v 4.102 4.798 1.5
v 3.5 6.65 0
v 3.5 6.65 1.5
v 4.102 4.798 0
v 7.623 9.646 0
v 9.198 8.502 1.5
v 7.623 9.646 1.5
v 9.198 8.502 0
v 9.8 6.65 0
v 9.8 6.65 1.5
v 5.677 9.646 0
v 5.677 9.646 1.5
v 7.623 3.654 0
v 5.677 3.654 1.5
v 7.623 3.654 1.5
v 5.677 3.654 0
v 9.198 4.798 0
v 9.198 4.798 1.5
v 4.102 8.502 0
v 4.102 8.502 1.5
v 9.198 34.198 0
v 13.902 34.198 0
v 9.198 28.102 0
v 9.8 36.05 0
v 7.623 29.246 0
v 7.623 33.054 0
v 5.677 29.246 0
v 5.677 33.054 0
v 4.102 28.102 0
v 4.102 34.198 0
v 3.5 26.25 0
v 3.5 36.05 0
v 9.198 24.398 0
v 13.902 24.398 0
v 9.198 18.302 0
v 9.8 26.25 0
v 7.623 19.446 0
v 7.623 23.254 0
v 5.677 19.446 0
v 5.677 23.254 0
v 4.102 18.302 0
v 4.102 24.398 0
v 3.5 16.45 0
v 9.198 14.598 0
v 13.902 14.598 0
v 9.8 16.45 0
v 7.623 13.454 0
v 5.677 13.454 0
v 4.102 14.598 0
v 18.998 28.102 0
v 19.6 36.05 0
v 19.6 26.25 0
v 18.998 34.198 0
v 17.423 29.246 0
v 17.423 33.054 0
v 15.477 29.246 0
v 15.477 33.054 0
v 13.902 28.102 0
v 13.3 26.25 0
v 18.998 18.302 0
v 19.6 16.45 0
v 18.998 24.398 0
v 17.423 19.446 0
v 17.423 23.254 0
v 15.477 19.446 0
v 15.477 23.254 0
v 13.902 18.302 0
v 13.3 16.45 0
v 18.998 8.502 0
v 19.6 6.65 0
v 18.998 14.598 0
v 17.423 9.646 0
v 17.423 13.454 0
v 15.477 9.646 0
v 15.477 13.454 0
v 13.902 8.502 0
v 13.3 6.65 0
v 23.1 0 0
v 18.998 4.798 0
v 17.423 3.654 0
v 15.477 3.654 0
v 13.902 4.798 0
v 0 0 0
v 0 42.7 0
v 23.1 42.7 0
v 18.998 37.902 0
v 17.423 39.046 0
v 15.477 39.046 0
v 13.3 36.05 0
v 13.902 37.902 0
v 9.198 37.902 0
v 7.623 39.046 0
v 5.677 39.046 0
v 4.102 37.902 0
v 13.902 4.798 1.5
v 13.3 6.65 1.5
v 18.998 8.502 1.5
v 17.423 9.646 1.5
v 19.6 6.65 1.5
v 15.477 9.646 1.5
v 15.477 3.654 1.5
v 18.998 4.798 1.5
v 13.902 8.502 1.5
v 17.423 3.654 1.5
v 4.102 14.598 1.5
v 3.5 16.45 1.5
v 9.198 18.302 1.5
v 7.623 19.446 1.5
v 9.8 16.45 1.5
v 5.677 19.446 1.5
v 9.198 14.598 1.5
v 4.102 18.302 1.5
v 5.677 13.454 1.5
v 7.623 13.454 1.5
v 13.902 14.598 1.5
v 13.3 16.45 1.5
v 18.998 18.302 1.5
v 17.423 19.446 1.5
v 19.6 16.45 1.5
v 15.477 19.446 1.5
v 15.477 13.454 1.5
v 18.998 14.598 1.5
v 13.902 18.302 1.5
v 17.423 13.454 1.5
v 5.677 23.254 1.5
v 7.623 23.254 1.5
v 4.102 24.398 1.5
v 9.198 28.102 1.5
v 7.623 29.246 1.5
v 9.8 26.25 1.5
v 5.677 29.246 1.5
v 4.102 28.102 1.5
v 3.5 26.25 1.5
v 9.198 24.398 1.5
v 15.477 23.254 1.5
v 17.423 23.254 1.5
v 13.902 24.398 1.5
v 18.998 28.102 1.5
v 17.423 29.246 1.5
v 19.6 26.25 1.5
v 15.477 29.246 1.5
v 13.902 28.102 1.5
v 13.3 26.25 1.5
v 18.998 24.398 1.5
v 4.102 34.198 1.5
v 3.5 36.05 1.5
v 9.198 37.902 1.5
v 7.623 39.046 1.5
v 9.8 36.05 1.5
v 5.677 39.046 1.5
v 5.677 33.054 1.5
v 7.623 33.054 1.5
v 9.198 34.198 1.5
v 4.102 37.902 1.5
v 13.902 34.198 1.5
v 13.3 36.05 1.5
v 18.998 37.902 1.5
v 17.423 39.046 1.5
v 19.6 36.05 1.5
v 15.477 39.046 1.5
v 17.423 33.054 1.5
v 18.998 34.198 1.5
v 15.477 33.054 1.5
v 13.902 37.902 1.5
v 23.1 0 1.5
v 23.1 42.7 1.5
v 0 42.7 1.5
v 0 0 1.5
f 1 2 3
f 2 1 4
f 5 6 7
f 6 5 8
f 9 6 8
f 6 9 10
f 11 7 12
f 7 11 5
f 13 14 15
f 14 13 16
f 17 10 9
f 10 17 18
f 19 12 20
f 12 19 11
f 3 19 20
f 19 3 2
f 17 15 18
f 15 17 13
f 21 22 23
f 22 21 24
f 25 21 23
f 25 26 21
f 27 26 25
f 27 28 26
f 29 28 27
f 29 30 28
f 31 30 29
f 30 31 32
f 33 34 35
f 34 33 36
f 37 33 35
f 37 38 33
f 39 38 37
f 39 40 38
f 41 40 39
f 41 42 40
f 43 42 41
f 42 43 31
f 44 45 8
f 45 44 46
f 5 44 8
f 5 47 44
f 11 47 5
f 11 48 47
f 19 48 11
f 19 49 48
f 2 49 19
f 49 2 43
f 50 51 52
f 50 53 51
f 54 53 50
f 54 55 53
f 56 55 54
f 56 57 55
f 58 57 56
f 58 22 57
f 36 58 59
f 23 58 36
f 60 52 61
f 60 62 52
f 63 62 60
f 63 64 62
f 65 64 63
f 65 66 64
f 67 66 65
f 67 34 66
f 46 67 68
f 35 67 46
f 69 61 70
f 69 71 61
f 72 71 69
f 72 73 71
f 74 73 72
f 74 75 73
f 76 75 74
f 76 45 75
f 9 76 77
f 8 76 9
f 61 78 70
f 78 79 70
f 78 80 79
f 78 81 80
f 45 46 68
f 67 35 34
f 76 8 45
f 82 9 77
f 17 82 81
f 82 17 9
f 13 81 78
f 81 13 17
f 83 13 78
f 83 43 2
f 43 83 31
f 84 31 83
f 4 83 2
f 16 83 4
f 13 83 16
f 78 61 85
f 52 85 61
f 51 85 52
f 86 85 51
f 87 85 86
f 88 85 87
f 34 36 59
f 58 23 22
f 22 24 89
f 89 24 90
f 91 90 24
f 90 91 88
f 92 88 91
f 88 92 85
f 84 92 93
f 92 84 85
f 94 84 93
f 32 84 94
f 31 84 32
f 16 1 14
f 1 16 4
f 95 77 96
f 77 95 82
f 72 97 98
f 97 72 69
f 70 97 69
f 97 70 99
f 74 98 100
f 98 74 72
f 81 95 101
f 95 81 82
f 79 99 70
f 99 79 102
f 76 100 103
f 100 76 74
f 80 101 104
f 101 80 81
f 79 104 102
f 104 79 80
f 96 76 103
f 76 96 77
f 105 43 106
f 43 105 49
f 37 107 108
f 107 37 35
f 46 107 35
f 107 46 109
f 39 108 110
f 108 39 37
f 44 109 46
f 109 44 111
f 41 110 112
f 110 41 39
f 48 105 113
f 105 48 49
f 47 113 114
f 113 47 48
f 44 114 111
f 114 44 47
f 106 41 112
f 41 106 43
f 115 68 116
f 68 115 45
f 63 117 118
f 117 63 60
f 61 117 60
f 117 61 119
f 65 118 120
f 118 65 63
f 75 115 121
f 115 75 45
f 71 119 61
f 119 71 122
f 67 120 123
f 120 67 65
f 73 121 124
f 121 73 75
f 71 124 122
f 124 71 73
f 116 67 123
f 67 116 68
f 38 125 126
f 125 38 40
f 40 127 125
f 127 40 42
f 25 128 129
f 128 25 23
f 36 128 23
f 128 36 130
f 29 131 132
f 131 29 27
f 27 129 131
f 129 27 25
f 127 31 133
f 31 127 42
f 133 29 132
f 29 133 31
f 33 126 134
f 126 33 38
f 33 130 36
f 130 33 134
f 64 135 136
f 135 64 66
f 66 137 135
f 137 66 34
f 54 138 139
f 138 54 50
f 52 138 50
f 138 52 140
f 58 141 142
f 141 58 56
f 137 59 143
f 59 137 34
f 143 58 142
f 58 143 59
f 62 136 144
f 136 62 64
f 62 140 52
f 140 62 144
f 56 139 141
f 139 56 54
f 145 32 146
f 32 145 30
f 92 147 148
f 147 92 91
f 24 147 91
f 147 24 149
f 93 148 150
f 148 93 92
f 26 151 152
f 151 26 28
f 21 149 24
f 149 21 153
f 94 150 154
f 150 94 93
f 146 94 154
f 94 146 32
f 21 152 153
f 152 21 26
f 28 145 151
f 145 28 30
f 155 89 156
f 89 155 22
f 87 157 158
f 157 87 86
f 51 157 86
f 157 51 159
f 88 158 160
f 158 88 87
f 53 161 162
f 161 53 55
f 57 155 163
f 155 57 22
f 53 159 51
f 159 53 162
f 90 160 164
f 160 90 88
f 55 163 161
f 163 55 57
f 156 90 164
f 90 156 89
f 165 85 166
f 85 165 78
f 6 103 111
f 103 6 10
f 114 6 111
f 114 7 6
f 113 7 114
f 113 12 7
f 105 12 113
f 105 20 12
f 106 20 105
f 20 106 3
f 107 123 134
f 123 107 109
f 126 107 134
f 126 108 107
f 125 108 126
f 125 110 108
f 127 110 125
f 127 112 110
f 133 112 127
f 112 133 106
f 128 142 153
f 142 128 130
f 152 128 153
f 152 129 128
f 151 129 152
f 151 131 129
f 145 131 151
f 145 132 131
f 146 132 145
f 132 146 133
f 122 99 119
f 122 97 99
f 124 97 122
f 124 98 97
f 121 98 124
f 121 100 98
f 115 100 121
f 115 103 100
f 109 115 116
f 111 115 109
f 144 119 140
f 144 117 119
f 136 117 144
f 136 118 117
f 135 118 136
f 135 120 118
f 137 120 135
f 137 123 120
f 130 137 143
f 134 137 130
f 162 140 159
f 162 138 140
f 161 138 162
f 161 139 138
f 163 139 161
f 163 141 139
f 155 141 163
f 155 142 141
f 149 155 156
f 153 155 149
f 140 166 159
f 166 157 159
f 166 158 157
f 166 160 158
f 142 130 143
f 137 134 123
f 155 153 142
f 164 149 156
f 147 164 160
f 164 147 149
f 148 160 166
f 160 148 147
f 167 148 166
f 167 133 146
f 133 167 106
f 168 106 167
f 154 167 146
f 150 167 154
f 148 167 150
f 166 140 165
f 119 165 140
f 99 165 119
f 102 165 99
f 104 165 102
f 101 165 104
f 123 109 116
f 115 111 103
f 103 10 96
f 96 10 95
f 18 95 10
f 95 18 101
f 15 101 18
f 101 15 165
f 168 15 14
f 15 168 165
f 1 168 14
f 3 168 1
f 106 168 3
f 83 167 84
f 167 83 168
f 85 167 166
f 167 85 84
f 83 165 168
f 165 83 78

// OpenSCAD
n = 2;
m = 4;

t = 3.5;
d = 6.3;

h = 1.5;

difference(){
    cube([(d + t) * n + t, (d + t) * m + t, h]);
    for (y = [t + d/2:d+t:m*(d + t)]){
        for (x = [t + d/2:d+t:n*(d + t)]){
            translate([x, y, 0])
            cylinder(2*t, d/2, d/2);
        }
    }
}
